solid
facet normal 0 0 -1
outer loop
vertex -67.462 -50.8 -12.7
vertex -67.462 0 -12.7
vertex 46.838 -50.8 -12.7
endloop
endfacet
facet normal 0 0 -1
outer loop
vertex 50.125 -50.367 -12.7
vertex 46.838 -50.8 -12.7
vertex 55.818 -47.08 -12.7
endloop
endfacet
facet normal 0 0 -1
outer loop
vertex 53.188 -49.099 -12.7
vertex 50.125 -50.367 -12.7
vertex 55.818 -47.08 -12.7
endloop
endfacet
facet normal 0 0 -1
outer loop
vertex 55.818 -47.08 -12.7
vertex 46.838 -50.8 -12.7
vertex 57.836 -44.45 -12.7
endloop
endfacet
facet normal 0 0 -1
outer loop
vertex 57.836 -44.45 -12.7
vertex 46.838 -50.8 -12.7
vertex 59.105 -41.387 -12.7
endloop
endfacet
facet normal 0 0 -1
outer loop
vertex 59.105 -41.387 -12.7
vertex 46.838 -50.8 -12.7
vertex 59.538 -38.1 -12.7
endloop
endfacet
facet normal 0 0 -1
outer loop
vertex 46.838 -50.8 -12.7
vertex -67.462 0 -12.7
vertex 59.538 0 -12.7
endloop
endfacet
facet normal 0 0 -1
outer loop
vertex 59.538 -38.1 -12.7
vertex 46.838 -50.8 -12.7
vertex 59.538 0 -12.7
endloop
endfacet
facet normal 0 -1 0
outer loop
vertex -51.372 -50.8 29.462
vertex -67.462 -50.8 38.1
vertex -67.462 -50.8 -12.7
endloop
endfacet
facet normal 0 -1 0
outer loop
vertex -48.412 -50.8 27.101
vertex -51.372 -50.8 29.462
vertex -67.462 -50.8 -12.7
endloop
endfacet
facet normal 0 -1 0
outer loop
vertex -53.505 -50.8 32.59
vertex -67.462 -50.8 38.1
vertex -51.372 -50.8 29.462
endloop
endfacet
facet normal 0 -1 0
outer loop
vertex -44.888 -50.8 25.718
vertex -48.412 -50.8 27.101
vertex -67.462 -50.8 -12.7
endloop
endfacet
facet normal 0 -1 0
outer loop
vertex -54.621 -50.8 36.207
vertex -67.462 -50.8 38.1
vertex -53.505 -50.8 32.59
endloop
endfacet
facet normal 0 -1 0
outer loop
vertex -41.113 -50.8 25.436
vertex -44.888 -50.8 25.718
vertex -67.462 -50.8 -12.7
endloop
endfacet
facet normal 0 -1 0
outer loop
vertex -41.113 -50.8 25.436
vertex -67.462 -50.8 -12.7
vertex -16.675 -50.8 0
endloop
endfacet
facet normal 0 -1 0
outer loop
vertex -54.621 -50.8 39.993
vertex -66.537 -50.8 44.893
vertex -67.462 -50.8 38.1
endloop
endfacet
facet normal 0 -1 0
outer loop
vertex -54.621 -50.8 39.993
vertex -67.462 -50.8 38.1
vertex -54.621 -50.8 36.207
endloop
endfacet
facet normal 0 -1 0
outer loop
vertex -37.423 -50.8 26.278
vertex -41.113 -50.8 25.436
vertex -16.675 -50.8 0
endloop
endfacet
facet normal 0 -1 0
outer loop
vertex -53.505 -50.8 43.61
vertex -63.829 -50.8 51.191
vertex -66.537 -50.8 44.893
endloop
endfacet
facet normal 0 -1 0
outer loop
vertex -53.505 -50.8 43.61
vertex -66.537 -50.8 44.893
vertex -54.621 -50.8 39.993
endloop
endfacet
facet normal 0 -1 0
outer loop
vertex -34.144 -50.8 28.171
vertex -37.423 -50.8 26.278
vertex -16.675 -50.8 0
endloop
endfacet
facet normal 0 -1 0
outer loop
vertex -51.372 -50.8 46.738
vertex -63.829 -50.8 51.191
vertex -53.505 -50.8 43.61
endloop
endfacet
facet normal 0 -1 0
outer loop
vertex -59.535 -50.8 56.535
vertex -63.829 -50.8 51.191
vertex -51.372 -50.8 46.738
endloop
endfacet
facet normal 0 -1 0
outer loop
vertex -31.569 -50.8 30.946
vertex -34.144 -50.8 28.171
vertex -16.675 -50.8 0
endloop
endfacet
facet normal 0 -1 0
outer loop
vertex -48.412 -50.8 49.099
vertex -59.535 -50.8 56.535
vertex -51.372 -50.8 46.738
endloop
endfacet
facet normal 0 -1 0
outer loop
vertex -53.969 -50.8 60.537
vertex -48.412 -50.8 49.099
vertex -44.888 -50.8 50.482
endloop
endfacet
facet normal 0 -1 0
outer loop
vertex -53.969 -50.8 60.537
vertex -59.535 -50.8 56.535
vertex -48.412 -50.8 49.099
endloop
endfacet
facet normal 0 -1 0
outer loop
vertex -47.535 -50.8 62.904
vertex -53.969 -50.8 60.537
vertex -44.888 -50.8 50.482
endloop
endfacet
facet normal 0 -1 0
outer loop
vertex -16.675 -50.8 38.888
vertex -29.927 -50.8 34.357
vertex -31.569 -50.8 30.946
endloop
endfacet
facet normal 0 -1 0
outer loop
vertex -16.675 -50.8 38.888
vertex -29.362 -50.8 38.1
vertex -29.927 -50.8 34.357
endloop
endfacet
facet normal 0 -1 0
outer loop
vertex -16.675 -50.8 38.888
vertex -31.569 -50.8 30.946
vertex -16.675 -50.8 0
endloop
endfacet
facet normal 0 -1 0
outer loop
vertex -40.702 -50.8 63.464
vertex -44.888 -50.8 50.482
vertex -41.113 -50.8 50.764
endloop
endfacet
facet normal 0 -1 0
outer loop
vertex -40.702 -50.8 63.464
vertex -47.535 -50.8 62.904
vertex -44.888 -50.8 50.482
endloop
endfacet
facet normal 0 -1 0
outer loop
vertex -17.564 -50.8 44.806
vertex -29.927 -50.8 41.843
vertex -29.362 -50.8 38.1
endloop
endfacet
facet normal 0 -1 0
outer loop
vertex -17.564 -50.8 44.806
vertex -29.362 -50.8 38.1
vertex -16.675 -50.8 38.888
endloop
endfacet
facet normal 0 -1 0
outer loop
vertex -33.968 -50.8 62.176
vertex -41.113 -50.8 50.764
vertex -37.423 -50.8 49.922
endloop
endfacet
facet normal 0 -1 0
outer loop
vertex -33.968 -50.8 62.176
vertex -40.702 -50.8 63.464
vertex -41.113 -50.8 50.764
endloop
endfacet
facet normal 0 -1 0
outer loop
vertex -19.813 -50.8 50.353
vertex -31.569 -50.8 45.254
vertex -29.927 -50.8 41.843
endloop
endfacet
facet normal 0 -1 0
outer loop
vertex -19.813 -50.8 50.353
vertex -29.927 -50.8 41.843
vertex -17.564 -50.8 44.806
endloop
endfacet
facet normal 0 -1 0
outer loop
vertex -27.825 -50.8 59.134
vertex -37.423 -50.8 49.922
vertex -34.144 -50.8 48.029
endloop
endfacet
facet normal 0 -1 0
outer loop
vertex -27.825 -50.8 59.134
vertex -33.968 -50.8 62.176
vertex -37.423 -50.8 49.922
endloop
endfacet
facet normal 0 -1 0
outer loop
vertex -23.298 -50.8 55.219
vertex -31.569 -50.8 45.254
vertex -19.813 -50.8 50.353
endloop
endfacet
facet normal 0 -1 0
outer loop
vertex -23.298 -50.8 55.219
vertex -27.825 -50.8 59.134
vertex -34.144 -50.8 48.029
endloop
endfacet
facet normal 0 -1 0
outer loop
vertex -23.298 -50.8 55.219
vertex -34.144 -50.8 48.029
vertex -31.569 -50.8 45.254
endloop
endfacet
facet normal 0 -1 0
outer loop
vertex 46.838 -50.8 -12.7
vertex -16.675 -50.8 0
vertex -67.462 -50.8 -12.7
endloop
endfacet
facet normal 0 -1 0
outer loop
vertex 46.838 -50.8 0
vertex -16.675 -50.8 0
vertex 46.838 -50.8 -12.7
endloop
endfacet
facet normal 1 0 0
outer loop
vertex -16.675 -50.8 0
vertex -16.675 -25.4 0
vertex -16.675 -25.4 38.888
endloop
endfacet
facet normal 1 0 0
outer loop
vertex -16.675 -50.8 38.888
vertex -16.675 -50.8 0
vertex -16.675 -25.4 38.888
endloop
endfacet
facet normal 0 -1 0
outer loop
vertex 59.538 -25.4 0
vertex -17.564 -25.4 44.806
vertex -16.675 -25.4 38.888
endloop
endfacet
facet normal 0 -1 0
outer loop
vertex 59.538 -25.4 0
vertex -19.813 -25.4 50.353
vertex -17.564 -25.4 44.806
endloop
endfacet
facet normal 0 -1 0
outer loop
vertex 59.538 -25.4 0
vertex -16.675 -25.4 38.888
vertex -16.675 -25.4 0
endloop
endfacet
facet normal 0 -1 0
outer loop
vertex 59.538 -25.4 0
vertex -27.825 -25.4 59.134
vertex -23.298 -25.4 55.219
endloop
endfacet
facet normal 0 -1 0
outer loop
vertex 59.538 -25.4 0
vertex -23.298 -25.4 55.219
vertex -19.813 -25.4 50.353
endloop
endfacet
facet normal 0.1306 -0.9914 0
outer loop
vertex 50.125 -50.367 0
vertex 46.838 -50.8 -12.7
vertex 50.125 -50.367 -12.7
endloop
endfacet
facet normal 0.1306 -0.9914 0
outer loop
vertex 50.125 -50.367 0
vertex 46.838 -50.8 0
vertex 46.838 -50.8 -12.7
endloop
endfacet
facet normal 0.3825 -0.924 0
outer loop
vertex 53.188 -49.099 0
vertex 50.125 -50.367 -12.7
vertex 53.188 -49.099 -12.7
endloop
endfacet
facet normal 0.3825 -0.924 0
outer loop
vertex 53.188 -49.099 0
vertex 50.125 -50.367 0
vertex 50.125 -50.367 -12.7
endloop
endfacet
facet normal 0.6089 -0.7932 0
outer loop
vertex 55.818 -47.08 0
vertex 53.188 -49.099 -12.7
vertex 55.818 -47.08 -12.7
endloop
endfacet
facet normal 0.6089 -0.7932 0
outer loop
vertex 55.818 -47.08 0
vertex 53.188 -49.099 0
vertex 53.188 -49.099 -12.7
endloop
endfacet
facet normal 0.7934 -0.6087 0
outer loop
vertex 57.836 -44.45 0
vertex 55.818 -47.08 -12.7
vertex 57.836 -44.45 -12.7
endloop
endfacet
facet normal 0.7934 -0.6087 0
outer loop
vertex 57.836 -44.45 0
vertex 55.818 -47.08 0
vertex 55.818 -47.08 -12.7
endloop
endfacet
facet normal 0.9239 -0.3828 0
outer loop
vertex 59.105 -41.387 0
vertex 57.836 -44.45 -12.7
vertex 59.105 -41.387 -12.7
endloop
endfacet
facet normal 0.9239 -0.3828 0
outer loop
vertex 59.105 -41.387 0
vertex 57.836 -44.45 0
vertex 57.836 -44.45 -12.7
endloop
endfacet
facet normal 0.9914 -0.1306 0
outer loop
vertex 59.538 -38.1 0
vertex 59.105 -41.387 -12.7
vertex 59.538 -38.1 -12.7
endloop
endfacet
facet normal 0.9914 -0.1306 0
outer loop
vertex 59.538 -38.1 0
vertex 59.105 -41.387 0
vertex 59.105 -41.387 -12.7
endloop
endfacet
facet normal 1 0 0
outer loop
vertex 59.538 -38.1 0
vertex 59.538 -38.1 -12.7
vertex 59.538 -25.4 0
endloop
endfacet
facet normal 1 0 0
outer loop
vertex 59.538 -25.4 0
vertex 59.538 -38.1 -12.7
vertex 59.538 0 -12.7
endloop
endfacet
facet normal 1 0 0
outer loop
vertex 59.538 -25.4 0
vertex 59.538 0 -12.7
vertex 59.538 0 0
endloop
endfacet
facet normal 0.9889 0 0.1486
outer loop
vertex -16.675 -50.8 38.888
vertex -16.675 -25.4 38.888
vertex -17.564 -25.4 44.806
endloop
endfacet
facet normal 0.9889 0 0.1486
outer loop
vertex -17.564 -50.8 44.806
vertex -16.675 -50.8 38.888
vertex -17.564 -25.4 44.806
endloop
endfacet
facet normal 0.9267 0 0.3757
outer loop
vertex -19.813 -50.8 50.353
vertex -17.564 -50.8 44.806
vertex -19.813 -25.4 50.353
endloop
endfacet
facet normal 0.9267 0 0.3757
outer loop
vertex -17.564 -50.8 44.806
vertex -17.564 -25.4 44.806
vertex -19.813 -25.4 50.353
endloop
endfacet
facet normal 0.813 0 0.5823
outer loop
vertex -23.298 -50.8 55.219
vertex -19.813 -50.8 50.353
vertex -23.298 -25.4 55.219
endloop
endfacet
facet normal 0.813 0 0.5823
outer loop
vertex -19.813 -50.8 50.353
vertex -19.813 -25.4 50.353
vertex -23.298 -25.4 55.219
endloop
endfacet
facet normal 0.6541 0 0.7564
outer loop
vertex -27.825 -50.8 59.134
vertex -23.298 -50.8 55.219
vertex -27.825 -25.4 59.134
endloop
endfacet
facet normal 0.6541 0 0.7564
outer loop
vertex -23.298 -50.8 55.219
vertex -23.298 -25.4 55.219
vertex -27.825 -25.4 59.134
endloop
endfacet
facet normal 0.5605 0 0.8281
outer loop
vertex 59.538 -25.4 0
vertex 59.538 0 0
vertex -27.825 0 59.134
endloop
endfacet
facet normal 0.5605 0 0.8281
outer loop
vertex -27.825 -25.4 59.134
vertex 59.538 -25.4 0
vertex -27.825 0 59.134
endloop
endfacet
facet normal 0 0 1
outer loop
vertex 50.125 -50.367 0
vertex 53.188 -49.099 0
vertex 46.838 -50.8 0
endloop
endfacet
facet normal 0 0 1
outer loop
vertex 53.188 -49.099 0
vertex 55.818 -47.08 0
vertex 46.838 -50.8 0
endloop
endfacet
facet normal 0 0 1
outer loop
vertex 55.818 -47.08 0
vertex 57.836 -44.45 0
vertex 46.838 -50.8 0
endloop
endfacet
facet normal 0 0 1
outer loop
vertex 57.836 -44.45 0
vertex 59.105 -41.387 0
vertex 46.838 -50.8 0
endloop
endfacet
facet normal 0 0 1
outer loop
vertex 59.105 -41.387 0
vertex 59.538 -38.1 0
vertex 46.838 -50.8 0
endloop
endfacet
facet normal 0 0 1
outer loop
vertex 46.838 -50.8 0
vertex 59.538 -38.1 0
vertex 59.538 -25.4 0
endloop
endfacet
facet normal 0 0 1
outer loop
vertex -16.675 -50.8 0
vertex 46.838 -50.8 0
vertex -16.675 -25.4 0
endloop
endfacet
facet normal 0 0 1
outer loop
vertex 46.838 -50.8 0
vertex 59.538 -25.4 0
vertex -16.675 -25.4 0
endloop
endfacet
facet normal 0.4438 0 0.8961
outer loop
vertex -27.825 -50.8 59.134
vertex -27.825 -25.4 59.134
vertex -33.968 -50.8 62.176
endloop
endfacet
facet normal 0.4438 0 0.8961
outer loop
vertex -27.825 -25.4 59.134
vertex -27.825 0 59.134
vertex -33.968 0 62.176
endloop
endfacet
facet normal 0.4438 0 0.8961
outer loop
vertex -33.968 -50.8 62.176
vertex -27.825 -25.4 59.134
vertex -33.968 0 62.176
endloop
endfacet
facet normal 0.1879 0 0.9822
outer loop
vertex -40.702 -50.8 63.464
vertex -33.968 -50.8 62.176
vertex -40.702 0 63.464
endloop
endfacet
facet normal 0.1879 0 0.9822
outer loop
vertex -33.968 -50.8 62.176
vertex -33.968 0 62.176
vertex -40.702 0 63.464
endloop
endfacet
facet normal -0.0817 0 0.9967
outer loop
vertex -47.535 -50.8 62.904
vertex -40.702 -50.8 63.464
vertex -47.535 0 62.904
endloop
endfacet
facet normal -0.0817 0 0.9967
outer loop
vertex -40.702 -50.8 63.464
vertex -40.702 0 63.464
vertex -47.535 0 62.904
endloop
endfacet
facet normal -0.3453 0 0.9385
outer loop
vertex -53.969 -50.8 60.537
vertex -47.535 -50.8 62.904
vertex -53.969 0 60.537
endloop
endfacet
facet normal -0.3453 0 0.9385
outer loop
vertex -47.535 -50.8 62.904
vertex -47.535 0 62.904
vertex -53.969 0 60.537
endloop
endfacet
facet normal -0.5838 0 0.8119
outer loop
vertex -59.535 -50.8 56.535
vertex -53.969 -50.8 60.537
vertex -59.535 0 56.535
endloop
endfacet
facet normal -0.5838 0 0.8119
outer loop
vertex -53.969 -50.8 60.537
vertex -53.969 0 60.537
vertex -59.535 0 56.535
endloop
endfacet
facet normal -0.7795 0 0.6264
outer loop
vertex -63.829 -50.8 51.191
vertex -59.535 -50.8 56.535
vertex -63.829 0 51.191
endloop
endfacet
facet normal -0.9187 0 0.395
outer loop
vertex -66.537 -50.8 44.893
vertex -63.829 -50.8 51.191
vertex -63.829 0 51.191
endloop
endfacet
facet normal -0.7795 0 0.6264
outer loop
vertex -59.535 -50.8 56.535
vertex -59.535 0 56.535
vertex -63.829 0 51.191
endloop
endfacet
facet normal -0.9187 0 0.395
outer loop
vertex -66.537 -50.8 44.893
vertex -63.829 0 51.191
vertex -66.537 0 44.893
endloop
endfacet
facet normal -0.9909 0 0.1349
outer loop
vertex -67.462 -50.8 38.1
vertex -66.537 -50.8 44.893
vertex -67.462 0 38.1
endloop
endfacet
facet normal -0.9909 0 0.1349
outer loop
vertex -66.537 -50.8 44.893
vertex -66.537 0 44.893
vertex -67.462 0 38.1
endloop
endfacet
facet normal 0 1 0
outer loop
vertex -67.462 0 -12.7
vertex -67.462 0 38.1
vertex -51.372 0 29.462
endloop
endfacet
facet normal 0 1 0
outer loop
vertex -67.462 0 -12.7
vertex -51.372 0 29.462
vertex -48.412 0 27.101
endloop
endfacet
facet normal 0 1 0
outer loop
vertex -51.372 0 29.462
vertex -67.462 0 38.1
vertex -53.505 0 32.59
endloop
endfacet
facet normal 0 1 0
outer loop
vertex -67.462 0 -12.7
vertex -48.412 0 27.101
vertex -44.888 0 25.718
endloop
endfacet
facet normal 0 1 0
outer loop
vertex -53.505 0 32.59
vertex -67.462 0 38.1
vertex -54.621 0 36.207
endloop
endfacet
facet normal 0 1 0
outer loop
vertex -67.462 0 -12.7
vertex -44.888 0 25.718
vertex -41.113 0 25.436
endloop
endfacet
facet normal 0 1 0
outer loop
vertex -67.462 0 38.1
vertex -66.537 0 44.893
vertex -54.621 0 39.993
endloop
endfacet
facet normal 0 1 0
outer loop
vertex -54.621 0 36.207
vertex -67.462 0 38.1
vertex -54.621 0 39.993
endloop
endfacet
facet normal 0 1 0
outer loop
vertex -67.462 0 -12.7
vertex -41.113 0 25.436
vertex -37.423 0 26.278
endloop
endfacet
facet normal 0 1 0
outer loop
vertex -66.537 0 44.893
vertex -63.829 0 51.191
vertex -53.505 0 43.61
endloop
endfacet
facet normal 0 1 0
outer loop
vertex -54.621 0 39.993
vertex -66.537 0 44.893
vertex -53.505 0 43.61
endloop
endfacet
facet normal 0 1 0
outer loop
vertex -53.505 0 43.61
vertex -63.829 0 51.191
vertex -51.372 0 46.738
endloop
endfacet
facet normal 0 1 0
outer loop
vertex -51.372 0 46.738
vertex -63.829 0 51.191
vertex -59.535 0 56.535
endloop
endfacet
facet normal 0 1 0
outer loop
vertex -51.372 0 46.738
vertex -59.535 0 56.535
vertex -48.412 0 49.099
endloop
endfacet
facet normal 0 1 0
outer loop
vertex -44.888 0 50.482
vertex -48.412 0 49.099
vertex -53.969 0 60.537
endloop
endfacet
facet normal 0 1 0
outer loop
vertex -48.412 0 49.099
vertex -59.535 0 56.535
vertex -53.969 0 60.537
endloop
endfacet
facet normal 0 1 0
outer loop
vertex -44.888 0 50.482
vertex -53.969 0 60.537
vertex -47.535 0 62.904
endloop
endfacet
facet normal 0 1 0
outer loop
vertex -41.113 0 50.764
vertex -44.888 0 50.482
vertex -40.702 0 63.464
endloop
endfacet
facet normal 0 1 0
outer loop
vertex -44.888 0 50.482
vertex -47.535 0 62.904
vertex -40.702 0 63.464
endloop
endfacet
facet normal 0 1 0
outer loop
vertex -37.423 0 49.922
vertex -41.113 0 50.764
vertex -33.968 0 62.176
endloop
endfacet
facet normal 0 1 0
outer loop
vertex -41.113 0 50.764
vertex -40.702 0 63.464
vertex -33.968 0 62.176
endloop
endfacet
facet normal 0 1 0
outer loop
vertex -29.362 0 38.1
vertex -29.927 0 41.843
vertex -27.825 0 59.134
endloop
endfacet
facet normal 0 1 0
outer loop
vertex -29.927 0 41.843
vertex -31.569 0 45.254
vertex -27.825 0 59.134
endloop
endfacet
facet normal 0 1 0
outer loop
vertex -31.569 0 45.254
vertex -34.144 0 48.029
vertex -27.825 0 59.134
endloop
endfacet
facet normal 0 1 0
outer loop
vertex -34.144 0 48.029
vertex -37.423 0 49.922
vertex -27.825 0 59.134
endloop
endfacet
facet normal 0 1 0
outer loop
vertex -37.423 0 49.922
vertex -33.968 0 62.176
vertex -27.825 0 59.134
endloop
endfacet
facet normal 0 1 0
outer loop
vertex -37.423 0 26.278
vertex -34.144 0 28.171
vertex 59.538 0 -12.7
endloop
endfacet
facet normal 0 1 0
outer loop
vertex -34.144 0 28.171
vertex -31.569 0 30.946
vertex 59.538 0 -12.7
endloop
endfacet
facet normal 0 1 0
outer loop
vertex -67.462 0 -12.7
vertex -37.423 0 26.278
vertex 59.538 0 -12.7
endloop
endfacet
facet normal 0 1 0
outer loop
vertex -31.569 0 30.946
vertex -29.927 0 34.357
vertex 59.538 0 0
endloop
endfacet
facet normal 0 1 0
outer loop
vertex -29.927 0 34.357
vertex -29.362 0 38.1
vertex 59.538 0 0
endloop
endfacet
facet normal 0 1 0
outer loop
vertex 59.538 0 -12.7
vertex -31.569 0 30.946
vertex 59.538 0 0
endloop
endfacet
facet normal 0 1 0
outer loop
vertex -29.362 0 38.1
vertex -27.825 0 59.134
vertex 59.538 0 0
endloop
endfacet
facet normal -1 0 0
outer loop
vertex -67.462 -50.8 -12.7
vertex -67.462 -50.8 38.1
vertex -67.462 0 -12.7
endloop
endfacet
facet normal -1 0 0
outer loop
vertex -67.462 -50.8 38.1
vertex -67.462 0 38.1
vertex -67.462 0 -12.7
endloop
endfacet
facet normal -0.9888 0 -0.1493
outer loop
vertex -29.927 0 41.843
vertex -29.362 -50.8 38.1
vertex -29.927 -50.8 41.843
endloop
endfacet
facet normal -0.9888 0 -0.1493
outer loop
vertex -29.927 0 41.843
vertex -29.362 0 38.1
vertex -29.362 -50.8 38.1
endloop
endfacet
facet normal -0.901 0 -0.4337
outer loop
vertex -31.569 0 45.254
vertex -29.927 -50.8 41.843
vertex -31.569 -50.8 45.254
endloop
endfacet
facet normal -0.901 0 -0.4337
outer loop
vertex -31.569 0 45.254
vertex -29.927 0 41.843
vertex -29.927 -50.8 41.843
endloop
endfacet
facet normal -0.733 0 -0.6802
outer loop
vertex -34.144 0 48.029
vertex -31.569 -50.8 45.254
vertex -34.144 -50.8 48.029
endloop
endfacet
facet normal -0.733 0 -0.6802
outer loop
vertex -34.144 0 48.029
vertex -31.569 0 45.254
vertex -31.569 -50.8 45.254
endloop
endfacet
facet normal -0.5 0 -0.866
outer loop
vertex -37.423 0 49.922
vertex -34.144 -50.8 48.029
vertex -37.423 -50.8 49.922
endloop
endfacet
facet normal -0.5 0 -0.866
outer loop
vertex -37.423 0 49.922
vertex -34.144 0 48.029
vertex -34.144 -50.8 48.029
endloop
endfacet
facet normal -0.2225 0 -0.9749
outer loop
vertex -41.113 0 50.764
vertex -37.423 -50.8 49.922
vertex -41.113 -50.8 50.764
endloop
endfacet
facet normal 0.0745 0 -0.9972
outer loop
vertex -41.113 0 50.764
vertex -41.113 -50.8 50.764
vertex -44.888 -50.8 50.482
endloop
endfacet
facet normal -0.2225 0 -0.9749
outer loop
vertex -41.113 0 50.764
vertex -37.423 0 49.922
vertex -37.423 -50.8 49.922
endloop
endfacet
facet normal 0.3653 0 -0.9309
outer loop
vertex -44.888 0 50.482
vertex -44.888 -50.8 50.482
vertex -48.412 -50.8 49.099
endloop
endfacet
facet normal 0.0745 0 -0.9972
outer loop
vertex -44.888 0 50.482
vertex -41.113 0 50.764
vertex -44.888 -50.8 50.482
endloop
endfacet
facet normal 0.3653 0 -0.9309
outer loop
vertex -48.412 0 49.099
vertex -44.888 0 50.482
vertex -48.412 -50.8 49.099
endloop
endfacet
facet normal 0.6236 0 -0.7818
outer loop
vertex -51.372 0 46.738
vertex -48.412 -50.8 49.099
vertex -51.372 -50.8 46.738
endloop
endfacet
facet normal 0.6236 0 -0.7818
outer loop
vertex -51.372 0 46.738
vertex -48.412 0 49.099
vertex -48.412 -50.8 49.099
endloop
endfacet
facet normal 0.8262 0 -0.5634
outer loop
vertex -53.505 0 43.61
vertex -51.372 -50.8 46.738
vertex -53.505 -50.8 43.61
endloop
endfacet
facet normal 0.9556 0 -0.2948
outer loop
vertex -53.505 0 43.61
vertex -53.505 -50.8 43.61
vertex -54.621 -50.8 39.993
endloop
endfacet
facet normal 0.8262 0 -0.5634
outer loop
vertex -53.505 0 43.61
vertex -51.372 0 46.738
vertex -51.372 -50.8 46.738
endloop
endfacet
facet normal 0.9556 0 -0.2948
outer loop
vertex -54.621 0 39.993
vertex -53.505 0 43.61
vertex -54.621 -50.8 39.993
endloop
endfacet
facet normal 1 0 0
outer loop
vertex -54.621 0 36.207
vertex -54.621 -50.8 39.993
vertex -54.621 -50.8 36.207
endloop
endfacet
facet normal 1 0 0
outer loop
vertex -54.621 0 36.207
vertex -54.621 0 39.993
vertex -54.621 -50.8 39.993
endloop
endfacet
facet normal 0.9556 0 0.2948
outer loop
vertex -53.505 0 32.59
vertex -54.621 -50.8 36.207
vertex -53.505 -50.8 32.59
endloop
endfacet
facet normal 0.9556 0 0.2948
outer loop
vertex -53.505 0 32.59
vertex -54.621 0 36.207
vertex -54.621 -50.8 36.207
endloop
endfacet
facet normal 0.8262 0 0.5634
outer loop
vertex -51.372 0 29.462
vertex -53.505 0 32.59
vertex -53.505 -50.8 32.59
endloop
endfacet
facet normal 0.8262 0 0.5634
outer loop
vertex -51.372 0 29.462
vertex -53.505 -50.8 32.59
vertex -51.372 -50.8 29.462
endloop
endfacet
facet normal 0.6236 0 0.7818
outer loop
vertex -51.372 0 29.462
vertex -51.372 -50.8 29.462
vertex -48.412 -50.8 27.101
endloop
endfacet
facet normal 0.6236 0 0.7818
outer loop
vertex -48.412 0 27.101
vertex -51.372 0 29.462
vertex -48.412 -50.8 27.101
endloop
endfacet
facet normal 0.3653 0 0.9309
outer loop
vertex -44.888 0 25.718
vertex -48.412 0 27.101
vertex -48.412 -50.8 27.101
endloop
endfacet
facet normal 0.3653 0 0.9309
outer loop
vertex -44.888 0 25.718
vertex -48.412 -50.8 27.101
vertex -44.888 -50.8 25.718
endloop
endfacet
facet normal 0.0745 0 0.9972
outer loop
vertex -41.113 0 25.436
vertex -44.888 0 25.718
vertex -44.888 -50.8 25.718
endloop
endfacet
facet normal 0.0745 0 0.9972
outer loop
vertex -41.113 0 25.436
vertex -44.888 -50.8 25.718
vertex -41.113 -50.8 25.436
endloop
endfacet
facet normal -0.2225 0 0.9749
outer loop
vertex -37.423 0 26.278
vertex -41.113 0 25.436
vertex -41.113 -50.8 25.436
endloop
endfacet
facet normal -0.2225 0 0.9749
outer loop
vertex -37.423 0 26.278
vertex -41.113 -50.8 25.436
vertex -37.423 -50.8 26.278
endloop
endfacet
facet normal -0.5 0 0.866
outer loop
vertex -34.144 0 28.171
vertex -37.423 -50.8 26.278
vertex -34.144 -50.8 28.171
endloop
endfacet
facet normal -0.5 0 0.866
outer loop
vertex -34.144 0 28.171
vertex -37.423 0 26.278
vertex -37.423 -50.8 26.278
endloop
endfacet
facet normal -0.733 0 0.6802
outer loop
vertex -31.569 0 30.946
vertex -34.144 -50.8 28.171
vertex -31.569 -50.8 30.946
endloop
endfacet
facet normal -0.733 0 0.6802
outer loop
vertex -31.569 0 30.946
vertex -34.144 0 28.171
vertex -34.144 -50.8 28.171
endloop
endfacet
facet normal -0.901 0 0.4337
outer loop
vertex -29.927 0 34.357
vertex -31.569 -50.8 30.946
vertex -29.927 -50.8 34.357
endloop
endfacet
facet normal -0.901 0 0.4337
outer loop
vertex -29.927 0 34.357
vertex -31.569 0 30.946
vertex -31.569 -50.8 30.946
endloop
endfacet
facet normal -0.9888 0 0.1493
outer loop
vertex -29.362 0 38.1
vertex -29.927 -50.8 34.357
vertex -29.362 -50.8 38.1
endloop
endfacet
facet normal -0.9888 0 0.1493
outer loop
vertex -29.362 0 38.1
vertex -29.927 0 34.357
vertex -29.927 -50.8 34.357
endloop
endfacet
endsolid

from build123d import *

# Parameters (mm, degrees)
F0_R     = 12.7
F1_DEPTH = 25.4
F2_R     = 12.7
F3_DEPTH = 25.4
F4_R     = 12.7


with BuildPart() as f1:
    # F0 (on Front) → F1 (new body)
    with BuildSketch(Plane.XZ):
        with BuildLine():
            Line((59.5375982285, 0), (-27.8245286434, 59.1343283417))
            ThreePointArc((-27.8245286434, 59.1343283417), (-53.9686611032, 60.5365993129), (-67.4624017715, 38.1))
            Line((-67.4624017715, 38.1), (-67.4624017715, -12.7))
            Line((-67.4624017715, -12.7), (59.5375982285, -12.7))
            Line((59.5375982285, -12.7), (59.5375982285, 0))
        make_face()
        with Locations((-42.0624017715, 38.1)):
            Circle(F0_R, mode=Mode.SUBTRACT)
    extrude(amount=F1_DEPTH)

    # F2 (on face) → F3 (join)
    with BuildSketch(Plane.XZ.offset(25.4)):
        with BuildLine():
            Line((-16.6746217208, 0), (-16.6746217208, 37.3122030112))
            Line((-16.6746217208, 37.3122030112), (-16.6746217208, 38.8877969888))
            ThreePointArc((-16.6746217208, 38.8877969888), (-19.8131634606, 50.352811701), (-27.8245286434, 59.1343283417))
            ThreePointArc((-27.8245286434, 59.1343283417), (-53.9686611032, 60.5365993129), (-67.4624017715, 38.1))
            Line((-67.4624017715, 38.1), (-67.4624017715, 0))
            Line((-67.4624017715, 0), (-67.4624017715, -12.7))
            Line((-67.4624017715, -12.7), (59.5375982285, -12.7))
            Line((59.5375982285, -12.7), (59.5375982285, 0))
            Line((59.5375982285, 0), (-16.6746217208, 0))
        make_face()
        with Locations((-42.0624017715, 38.1)):
            Circle(F2_R, mode=Mode.SUBTRACT)
    extrude(amount=F3_DEPTH)

    # F4
    f4_edges = [f1.edges().sort_by_distance(p)[0] for p in [
        (59.537598, -50.8, -6.35),
    ]]
    fillet(f4_edges, radius=F4_R)


solid = f1.part
